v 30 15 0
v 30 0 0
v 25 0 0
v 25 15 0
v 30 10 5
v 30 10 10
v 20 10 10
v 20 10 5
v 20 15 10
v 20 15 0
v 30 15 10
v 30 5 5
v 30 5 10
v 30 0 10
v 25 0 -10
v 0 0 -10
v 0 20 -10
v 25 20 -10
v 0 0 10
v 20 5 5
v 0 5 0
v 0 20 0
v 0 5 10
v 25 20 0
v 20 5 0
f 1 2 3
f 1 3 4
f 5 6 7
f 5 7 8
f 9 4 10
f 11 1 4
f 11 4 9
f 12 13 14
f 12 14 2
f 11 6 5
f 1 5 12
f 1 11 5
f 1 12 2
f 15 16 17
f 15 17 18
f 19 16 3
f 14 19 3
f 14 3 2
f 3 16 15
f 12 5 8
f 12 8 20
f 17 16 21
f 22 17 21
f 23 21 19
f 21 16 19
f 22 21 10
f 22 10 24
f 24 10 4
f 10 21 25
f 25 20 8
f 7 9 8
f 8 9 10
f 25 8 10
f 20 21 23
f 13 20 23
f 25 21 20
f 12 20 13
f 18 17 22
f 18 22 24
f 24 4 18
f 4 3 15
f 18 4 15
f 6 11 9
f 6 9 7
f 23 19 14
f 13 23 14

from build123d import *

# Parameters (mm, degrees)
SKETCH_1_W      = 25
SKETCH_1_H      = 10
EXTRUDE_1_DEPTH = 20
EXTRUDE_2_DEPTH = 5
EXTRUDE_3_DEPTH = 10


with BuildPart() as part:
    # 草圖1 → 填料-伸長1 (new body)
    with BuildSketch(Plane(origin=(0, 0, 0), x_dir=(1, 0, 0), z_dir=(0, 1, 0))):
        with Locations((12.5, 5)):
            Rectangle(SKETCH_1_W, SKETCH_1_H)
    extrude(amount=EXTRUDE_1_DEPTH)

    # 草圖1<3> → 填料-伸長2 (add)
    with BuildSketch(Plane(origin=(0, 0, 0), x_dir=(1, 0, 0), z_dir=(0, 1, 0))):
        Polygon((25, 0), (0, 0), (0, -10), (30, -10), (30, 0), align=None)
    extrude(amount=EXTRUDE_2_DEPTH)

    # 草圖2 → 填料-伸長3 (add)
    with BuildSketch(Plane(origin=(30, 0, 0), x_dir=(0, 0, -1), z_dir=(1, 0, 0))):
        Polygon((-5, 5), (0, 5), (0, 11.350931175), (0, 15), (-10, 15), (-10, 10), (-5, 10), align=None)
    extrude(amount=-EXTRUDE_3_DEPTH)


solid = part.part
